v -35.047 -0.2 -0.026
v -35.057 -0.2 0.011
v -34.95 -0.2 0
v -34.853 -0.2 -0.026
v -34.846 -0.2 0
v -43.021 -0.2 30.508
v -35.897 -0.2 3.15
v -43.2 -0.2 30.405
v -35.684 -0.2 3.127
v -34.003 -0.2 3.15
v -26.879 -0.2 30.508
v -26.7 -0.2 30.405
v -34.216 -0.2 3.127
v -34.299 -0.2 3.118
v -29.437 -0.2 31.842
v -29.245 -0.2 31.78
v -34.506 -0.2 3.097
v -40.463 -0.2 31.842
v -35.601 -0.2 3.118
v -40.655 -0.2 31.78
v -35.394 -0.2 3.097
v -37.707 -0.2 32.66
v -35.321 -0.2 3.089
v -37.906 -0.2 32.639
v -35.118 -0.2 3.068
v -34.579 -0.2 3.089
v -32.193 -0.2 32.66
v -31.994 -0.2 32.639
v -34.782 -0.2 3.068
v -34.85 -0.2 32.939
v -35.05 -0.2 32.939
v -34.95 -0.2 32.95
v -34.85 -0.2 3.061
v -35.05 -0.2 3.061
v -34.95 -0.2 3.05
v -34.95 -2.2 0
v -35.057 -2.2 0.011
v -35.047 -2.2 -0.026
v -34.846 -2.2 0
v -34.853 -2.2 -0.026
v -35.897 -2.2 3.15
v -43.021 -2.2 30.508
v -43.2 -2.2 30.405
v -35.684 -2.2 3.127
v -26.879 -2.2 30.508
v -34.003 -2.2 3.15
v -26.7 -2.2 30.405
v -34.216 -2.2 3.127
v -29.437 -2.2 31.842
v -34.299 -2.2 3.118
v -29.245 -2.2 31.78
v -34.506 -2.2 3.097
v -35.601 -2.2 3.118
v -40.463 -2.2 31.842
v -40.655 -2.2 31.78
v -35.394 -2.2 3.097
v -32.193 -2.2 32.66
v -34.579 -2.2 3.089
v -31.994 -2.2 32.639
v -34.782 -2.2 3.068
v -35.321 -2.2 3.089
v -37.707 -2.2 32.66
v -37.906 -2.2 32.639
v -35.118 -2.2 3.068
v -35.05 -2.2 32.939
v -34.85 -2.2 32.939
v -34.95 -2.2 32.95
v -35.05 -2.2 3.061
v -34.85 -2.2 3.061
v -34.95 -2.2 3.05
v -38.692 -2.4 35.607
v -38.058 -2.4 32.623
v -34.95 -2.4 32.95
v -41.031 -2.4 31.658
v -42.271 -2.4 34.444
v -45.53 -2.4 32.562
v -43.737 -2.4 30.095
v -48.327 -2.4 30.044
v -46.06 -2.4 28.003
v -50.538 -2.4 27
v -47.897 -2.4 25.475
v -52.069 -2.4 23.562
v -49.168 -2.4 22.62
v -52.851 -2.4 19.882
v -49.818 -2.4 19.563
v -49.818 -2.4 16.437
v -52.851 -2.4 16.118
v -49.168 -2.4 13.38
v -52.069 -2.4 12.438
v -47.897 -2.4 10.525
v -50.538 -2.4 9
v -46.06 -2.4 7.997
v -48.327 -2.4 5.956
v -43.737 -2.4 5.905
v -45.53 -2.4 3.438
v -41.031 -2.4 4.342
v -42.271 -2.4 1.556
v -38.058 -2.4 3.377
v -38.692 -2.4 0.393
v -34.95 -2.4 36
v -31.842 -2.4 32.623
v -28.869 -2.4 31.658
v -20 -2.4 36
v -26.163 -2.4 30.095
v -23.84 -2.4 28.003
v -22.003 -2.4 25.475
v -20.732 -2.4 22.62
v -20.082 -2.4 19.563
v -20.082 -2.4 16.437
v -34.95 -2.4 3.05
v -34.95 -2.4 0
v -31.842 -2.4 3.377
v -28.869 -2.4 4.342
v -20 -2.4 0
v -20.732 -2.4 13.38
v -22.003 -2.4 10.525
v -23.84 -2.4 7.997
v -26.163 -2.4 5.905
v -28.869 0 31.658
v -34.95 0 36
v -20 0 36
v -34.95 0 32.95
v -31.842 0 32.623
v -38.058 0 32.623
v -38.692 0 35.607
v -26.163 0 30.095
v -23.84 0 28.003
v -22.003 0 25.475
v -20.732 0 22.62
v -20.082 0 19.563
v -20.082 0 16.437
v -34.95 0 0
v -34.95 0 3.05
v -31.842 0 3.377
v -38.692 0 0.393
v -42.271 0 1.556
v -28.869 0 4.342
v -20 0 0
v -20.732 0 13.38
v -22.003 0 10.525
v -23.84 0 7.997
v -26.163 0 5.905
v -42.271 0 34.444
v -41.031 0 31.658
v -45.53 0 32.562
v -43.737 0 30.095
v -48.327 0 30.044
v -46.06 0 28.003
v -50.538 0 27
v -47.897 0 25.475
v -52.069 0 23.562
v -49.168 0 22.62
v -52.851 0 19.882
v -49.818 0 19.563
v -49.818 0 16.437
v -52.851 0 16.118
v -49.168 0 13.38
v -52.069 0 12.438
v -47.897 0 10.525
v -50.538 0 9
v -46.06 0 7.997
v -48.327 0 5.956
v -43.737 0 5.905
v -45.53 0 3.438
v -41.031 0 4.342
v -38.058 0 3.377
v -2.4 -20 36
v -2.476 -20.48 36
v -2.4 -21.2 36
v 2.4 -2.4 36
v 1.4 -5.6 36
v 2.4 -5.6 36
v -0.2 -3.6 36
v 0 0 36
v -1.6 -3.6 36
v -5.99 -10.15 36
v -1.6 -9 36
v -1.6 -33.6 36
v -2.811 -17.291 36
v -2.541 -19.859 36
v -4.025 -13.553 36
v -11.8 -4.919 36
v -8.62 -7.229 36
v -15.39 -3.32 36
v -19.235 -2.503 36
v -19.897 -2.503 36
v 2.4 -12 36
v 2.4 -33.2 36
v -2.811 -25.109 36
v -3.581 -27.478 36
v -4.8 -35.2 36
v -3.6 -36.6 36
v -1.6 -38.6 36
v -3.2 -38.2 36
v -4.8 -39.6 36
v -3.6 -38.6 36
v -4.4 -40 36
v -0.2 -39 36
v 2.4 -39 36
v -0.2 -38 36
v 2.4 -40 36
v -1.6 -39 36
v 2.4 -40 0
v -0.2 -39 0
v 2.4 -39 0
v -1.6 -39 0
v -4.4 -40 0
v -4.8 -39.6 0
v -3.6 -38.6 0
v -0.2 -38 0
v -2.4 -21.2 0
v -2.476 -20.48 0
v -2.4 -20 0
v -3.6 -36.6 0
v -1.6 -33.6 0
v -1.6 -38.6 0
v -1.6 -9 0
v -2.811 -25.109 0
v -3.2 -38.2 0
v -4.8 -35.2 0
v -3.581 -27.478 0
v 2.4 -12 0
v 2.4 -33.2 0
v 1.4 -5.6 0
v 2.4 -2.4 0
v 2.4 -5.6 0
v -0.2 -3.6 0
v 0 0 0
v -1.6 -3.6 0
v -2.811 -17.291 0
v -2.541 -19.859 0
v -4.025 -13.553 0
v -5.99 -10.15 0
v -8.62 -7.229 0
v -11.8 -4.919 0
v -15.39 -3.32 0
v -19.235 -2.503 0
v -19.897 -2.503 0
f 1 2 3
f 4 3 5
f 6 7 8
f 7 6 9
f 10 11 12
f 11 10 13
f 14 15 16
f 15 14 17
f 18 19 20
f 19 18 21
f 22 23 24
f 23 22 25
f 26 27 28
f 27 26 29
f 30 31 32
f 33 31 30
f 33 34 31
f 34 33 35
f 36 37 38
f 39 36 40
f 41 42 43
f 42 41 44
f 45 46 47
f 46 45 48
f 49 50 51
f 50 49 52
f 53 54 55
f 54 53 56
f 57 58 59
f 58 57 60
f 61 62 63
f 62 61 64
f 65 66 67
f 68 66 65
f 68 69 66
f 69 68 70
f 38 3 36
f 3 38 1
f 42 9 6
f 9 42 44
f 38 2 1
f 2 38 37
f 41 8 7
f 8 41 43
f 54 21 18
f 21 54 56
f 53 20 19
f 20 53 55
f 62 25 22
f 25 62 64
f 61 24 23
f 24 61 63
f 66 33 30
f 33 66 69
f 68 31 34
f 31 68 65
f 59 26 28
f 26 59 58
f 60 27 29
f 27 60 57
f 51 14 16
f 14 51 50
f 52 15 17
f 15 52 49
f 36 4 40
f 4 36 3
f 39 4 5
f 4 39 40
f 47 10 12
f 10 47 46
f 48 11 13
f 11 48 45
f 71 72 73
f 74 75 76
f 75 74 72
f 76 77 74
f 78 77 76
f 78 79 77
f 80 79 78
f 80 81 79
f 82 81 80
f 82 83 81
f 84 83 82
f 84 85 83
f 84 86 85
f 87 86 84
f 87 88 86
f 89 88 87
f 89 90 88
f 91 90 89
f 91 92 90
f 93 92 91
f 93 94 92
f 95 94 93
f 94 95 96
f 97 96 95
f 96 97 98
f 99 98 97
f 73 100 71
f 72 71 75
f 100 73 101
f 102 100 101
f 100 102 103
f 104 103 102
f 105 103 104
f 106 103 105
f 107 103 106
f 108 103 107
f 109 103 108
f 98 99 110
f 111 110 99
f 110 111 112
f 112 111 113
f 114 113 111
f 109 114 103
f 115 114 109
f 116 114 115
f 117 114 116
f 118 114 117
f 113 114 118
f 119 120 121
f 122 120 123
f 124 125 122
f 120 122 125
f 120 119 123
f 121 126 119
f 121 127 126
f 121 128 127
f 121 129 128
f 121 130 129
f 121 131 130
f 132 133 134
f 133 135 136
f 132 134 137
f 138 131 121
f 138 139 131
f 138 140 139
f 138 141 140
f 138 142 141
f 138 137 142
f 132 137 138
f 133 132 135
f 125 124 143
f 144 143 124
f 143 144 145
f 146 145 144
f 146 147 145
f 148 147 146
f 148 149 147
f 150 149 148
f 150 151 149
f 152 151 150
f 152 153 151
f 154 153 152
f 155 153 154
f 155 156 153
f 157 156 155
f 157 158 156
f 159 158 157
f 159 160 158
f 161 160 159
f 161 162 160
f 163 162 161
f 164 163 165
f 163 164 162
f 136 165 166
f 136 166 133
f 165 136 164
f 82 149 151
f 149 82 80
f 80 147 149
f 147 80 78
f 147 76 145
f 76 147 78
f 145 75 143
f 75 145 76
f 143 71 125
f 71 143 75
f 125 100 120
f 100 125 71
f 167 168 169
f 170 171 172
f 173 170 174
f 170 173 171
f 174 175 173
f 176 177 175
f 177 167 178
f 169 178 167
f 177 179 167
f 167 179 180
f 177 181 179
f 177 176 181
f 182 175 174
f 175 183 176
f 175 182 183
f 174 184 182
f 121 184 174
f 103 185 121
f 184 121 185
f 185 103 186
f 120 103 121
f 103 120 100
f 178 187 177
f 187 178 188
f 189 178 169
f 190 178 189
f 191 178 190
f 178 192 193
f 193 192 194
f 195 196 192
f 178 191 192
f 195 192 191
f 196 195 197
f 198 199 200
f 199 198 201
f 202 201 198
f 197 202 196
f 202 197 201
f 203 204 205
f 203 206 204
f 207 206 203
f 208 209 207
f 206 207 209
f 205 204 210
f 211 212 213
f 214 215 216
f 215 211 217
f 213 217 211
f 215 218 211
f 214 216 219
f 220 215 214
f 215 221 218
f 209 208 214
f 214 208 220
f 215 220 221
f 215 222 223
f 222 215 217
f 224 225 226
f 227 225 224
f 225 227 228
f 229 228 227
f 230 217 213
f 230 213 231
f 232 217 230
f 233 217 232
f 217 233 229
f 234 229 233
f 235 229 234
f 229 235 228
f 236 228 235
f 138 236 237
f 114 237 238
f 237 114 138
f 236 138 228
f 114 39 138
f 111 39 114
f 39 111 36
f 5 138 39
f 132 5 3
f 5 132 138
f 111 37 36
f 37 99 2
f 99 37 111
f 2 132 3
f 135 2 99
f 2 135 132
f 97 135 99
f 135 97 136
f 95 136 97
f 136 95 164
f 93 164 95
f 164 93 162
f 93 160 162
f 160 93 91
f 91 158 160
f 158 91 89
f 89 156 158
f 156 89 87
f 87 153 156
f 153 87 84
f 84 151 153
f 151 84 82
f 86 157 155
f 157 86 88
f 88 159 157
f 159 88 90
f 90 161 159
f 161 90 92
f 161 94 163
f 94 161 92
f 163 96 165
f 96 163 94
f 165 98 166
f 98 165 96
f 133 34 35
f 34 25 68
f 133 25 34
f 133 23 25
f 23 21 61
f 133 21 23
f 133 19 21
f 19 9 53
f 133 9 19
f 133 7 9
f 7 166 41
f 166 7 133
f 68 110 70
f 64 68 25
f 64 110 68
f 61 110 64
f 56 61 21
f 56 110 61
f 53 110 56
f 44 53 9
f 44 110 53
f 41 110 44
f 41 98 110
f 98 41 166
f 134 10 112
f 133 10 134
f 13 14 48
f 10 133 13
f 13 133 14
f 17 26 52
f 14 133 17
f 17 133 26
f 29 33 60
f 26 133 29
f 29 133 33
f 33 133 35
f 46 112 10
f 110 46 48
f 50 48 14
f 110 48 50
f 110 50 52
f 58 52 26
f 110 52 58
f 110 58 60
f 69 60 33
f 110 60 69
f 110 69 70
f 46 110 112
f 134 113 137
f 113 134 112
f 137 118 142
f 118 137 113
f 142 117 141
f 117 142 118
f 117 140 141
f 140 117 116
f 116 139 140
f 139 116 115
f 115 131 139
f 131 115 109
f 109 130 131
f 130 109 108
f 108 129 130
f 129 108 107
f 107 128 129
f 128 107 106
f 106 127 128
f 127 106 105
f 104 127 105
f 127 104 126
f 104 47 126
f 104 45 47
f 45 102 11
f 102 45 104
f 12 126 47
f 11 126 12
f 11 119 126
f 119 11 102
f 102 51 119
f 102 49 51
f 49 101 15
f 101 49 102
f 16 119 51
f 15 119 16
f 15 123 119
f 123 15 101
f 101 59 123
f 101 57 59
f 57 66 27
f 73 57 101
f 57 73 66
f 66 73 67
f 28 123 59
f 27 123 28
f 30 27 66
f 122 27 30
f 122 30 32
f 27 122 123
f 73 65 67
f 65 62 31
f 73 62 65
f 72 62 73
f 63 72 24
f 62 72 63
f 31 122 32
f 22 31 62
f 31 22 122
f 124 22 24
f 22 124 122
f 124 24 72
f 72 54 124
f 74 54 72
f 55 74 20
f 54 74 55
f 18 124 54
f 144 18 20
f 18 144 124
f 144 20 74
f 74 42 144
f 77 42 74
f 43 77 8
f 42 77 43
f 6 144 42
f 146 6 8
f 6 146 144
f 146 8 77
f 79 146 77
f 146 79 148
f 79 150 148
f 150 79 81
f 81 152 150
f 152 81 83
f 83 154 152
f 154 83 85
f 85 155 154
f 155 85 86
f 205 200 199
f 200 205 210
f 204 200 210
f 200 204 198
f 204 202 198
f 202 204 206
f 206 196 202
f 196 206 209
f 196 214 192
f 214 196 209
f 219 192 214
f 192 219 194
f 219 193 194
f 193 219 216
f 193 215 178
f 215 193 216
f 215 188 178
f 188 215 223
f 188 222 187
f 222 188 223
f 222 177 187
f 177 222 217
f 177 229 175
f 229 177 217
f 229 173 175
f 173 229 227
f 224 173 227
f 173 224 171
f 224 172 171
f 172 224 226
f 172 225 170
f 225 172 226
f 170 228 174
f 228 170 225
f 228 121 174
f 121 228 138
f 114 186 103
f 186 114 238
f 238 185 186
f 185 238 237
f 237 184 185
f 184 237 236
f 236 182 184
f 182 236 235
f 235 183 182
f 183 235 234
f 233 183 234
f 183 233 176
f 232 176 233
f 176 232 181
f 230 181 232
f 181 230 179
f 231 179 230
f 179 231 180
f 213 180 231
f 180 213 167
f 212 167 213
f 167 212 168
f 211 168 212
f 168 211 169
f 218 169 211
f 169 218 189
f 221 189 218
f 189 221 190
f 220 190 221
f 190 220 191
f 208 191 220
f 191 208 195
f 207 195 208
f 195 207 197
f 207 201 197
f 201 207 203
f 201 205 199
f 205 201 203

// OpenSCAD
// Pressure regulator bracket
// Adrian McCarthy 2022


module pressure_regulator_bracket(nozzle_d=0.4) {
    id = 29.5 + nozzle_d;
    od = 36;
    th = 2.4;
    apron = 20; // from back of regulator knob to mounting plate

    module top() {
        linear_extrude(th, convexity=4) {
            difference() {
                hull() {
                    translate([-od/2, id/2])
                        square([od, apron]);
                    circle(d=od, $fs=nozzle_d/2);
                }
                circle(d=id, $fs=nozzle_d/2);
            }
        }

        // Custom supports right where we need them
        translate([-od/2, 0, 0]) {
            for (i = [-3:3]) {
                theta = 5*i;
                    rotate([0, 0, theta])
                        translate([0, -nozzle_d/4, nozzle_d/2])
                            cube([id+(od-id)/2, nozzle_d/2, th-nozzle_d]);
            }
        }
    }


    module back() {
        brace = apron;
        open_r = (2*brace - th) / 2;
        bottom = -40;

        // 35mm DIN rail dimensions
        din_notch_size = 5 + nozzle_d;
        din_notch_depth = 4;
        din_rail_th = 1 + nozzle_d;
        din_hook_depth = din_notch_depth - din_rail_th;

        lower = bottom + 1;
        upper = lower + 35 + nozzle_d;

        linear_extrude(od, convexity=4) {
            difference() {
                polygon([
                    [0, 0],
                    [-brace, 0],
                    [-brace, -th],
                    [-th, -brace],
                    [-2*th, bottom + 2*th],
                    [-2*th, bottom + nozzle_d],
                    [-2*th + nozzle_d, bottom],                    
                    [th, bottom],
                    [th, lower],
                    [th - din_hook_depth, lower + 1],
                    [th - din_hook_depth, lower],
                    [th - din_notch_depth, lower],
                    [1.2-2*th, lower + nozzle_d],
                    [1.2-2*th, lower + 2.4],
                    [1.2-2*th + nozzle_d, lower + 2*nozzle_d],
                    [th - din_notch_depth, lower + nozzle_d],
                    [th - din_notch_depth, lower + din_notch_size],
                    [th, lower + din_notch_size + nozzle_d],
                    [th, upper - din_notch_size - 3],
                    [th - din_notch_depth, upper - din_notch_size],
                    [th - din_notch_depth, upper],
                    [th - din_hook_depth, upper],
                    [th - 1, upper - 2],
                    [th, upper - 2],

                    [th, -th]
                ]);
                translate([-(th + open_r), -(th + open_r)])
                    circle(r=open_r, $fs=nozzle_d/2);
            }
        }
    }
    
    rotate([-90, 0, 0])
        translate([-(id/2 + apron), -od/2, -th])
            rotate([0, 0, -90])
                top();

    back();
}

pressure_regulator_bracket();
